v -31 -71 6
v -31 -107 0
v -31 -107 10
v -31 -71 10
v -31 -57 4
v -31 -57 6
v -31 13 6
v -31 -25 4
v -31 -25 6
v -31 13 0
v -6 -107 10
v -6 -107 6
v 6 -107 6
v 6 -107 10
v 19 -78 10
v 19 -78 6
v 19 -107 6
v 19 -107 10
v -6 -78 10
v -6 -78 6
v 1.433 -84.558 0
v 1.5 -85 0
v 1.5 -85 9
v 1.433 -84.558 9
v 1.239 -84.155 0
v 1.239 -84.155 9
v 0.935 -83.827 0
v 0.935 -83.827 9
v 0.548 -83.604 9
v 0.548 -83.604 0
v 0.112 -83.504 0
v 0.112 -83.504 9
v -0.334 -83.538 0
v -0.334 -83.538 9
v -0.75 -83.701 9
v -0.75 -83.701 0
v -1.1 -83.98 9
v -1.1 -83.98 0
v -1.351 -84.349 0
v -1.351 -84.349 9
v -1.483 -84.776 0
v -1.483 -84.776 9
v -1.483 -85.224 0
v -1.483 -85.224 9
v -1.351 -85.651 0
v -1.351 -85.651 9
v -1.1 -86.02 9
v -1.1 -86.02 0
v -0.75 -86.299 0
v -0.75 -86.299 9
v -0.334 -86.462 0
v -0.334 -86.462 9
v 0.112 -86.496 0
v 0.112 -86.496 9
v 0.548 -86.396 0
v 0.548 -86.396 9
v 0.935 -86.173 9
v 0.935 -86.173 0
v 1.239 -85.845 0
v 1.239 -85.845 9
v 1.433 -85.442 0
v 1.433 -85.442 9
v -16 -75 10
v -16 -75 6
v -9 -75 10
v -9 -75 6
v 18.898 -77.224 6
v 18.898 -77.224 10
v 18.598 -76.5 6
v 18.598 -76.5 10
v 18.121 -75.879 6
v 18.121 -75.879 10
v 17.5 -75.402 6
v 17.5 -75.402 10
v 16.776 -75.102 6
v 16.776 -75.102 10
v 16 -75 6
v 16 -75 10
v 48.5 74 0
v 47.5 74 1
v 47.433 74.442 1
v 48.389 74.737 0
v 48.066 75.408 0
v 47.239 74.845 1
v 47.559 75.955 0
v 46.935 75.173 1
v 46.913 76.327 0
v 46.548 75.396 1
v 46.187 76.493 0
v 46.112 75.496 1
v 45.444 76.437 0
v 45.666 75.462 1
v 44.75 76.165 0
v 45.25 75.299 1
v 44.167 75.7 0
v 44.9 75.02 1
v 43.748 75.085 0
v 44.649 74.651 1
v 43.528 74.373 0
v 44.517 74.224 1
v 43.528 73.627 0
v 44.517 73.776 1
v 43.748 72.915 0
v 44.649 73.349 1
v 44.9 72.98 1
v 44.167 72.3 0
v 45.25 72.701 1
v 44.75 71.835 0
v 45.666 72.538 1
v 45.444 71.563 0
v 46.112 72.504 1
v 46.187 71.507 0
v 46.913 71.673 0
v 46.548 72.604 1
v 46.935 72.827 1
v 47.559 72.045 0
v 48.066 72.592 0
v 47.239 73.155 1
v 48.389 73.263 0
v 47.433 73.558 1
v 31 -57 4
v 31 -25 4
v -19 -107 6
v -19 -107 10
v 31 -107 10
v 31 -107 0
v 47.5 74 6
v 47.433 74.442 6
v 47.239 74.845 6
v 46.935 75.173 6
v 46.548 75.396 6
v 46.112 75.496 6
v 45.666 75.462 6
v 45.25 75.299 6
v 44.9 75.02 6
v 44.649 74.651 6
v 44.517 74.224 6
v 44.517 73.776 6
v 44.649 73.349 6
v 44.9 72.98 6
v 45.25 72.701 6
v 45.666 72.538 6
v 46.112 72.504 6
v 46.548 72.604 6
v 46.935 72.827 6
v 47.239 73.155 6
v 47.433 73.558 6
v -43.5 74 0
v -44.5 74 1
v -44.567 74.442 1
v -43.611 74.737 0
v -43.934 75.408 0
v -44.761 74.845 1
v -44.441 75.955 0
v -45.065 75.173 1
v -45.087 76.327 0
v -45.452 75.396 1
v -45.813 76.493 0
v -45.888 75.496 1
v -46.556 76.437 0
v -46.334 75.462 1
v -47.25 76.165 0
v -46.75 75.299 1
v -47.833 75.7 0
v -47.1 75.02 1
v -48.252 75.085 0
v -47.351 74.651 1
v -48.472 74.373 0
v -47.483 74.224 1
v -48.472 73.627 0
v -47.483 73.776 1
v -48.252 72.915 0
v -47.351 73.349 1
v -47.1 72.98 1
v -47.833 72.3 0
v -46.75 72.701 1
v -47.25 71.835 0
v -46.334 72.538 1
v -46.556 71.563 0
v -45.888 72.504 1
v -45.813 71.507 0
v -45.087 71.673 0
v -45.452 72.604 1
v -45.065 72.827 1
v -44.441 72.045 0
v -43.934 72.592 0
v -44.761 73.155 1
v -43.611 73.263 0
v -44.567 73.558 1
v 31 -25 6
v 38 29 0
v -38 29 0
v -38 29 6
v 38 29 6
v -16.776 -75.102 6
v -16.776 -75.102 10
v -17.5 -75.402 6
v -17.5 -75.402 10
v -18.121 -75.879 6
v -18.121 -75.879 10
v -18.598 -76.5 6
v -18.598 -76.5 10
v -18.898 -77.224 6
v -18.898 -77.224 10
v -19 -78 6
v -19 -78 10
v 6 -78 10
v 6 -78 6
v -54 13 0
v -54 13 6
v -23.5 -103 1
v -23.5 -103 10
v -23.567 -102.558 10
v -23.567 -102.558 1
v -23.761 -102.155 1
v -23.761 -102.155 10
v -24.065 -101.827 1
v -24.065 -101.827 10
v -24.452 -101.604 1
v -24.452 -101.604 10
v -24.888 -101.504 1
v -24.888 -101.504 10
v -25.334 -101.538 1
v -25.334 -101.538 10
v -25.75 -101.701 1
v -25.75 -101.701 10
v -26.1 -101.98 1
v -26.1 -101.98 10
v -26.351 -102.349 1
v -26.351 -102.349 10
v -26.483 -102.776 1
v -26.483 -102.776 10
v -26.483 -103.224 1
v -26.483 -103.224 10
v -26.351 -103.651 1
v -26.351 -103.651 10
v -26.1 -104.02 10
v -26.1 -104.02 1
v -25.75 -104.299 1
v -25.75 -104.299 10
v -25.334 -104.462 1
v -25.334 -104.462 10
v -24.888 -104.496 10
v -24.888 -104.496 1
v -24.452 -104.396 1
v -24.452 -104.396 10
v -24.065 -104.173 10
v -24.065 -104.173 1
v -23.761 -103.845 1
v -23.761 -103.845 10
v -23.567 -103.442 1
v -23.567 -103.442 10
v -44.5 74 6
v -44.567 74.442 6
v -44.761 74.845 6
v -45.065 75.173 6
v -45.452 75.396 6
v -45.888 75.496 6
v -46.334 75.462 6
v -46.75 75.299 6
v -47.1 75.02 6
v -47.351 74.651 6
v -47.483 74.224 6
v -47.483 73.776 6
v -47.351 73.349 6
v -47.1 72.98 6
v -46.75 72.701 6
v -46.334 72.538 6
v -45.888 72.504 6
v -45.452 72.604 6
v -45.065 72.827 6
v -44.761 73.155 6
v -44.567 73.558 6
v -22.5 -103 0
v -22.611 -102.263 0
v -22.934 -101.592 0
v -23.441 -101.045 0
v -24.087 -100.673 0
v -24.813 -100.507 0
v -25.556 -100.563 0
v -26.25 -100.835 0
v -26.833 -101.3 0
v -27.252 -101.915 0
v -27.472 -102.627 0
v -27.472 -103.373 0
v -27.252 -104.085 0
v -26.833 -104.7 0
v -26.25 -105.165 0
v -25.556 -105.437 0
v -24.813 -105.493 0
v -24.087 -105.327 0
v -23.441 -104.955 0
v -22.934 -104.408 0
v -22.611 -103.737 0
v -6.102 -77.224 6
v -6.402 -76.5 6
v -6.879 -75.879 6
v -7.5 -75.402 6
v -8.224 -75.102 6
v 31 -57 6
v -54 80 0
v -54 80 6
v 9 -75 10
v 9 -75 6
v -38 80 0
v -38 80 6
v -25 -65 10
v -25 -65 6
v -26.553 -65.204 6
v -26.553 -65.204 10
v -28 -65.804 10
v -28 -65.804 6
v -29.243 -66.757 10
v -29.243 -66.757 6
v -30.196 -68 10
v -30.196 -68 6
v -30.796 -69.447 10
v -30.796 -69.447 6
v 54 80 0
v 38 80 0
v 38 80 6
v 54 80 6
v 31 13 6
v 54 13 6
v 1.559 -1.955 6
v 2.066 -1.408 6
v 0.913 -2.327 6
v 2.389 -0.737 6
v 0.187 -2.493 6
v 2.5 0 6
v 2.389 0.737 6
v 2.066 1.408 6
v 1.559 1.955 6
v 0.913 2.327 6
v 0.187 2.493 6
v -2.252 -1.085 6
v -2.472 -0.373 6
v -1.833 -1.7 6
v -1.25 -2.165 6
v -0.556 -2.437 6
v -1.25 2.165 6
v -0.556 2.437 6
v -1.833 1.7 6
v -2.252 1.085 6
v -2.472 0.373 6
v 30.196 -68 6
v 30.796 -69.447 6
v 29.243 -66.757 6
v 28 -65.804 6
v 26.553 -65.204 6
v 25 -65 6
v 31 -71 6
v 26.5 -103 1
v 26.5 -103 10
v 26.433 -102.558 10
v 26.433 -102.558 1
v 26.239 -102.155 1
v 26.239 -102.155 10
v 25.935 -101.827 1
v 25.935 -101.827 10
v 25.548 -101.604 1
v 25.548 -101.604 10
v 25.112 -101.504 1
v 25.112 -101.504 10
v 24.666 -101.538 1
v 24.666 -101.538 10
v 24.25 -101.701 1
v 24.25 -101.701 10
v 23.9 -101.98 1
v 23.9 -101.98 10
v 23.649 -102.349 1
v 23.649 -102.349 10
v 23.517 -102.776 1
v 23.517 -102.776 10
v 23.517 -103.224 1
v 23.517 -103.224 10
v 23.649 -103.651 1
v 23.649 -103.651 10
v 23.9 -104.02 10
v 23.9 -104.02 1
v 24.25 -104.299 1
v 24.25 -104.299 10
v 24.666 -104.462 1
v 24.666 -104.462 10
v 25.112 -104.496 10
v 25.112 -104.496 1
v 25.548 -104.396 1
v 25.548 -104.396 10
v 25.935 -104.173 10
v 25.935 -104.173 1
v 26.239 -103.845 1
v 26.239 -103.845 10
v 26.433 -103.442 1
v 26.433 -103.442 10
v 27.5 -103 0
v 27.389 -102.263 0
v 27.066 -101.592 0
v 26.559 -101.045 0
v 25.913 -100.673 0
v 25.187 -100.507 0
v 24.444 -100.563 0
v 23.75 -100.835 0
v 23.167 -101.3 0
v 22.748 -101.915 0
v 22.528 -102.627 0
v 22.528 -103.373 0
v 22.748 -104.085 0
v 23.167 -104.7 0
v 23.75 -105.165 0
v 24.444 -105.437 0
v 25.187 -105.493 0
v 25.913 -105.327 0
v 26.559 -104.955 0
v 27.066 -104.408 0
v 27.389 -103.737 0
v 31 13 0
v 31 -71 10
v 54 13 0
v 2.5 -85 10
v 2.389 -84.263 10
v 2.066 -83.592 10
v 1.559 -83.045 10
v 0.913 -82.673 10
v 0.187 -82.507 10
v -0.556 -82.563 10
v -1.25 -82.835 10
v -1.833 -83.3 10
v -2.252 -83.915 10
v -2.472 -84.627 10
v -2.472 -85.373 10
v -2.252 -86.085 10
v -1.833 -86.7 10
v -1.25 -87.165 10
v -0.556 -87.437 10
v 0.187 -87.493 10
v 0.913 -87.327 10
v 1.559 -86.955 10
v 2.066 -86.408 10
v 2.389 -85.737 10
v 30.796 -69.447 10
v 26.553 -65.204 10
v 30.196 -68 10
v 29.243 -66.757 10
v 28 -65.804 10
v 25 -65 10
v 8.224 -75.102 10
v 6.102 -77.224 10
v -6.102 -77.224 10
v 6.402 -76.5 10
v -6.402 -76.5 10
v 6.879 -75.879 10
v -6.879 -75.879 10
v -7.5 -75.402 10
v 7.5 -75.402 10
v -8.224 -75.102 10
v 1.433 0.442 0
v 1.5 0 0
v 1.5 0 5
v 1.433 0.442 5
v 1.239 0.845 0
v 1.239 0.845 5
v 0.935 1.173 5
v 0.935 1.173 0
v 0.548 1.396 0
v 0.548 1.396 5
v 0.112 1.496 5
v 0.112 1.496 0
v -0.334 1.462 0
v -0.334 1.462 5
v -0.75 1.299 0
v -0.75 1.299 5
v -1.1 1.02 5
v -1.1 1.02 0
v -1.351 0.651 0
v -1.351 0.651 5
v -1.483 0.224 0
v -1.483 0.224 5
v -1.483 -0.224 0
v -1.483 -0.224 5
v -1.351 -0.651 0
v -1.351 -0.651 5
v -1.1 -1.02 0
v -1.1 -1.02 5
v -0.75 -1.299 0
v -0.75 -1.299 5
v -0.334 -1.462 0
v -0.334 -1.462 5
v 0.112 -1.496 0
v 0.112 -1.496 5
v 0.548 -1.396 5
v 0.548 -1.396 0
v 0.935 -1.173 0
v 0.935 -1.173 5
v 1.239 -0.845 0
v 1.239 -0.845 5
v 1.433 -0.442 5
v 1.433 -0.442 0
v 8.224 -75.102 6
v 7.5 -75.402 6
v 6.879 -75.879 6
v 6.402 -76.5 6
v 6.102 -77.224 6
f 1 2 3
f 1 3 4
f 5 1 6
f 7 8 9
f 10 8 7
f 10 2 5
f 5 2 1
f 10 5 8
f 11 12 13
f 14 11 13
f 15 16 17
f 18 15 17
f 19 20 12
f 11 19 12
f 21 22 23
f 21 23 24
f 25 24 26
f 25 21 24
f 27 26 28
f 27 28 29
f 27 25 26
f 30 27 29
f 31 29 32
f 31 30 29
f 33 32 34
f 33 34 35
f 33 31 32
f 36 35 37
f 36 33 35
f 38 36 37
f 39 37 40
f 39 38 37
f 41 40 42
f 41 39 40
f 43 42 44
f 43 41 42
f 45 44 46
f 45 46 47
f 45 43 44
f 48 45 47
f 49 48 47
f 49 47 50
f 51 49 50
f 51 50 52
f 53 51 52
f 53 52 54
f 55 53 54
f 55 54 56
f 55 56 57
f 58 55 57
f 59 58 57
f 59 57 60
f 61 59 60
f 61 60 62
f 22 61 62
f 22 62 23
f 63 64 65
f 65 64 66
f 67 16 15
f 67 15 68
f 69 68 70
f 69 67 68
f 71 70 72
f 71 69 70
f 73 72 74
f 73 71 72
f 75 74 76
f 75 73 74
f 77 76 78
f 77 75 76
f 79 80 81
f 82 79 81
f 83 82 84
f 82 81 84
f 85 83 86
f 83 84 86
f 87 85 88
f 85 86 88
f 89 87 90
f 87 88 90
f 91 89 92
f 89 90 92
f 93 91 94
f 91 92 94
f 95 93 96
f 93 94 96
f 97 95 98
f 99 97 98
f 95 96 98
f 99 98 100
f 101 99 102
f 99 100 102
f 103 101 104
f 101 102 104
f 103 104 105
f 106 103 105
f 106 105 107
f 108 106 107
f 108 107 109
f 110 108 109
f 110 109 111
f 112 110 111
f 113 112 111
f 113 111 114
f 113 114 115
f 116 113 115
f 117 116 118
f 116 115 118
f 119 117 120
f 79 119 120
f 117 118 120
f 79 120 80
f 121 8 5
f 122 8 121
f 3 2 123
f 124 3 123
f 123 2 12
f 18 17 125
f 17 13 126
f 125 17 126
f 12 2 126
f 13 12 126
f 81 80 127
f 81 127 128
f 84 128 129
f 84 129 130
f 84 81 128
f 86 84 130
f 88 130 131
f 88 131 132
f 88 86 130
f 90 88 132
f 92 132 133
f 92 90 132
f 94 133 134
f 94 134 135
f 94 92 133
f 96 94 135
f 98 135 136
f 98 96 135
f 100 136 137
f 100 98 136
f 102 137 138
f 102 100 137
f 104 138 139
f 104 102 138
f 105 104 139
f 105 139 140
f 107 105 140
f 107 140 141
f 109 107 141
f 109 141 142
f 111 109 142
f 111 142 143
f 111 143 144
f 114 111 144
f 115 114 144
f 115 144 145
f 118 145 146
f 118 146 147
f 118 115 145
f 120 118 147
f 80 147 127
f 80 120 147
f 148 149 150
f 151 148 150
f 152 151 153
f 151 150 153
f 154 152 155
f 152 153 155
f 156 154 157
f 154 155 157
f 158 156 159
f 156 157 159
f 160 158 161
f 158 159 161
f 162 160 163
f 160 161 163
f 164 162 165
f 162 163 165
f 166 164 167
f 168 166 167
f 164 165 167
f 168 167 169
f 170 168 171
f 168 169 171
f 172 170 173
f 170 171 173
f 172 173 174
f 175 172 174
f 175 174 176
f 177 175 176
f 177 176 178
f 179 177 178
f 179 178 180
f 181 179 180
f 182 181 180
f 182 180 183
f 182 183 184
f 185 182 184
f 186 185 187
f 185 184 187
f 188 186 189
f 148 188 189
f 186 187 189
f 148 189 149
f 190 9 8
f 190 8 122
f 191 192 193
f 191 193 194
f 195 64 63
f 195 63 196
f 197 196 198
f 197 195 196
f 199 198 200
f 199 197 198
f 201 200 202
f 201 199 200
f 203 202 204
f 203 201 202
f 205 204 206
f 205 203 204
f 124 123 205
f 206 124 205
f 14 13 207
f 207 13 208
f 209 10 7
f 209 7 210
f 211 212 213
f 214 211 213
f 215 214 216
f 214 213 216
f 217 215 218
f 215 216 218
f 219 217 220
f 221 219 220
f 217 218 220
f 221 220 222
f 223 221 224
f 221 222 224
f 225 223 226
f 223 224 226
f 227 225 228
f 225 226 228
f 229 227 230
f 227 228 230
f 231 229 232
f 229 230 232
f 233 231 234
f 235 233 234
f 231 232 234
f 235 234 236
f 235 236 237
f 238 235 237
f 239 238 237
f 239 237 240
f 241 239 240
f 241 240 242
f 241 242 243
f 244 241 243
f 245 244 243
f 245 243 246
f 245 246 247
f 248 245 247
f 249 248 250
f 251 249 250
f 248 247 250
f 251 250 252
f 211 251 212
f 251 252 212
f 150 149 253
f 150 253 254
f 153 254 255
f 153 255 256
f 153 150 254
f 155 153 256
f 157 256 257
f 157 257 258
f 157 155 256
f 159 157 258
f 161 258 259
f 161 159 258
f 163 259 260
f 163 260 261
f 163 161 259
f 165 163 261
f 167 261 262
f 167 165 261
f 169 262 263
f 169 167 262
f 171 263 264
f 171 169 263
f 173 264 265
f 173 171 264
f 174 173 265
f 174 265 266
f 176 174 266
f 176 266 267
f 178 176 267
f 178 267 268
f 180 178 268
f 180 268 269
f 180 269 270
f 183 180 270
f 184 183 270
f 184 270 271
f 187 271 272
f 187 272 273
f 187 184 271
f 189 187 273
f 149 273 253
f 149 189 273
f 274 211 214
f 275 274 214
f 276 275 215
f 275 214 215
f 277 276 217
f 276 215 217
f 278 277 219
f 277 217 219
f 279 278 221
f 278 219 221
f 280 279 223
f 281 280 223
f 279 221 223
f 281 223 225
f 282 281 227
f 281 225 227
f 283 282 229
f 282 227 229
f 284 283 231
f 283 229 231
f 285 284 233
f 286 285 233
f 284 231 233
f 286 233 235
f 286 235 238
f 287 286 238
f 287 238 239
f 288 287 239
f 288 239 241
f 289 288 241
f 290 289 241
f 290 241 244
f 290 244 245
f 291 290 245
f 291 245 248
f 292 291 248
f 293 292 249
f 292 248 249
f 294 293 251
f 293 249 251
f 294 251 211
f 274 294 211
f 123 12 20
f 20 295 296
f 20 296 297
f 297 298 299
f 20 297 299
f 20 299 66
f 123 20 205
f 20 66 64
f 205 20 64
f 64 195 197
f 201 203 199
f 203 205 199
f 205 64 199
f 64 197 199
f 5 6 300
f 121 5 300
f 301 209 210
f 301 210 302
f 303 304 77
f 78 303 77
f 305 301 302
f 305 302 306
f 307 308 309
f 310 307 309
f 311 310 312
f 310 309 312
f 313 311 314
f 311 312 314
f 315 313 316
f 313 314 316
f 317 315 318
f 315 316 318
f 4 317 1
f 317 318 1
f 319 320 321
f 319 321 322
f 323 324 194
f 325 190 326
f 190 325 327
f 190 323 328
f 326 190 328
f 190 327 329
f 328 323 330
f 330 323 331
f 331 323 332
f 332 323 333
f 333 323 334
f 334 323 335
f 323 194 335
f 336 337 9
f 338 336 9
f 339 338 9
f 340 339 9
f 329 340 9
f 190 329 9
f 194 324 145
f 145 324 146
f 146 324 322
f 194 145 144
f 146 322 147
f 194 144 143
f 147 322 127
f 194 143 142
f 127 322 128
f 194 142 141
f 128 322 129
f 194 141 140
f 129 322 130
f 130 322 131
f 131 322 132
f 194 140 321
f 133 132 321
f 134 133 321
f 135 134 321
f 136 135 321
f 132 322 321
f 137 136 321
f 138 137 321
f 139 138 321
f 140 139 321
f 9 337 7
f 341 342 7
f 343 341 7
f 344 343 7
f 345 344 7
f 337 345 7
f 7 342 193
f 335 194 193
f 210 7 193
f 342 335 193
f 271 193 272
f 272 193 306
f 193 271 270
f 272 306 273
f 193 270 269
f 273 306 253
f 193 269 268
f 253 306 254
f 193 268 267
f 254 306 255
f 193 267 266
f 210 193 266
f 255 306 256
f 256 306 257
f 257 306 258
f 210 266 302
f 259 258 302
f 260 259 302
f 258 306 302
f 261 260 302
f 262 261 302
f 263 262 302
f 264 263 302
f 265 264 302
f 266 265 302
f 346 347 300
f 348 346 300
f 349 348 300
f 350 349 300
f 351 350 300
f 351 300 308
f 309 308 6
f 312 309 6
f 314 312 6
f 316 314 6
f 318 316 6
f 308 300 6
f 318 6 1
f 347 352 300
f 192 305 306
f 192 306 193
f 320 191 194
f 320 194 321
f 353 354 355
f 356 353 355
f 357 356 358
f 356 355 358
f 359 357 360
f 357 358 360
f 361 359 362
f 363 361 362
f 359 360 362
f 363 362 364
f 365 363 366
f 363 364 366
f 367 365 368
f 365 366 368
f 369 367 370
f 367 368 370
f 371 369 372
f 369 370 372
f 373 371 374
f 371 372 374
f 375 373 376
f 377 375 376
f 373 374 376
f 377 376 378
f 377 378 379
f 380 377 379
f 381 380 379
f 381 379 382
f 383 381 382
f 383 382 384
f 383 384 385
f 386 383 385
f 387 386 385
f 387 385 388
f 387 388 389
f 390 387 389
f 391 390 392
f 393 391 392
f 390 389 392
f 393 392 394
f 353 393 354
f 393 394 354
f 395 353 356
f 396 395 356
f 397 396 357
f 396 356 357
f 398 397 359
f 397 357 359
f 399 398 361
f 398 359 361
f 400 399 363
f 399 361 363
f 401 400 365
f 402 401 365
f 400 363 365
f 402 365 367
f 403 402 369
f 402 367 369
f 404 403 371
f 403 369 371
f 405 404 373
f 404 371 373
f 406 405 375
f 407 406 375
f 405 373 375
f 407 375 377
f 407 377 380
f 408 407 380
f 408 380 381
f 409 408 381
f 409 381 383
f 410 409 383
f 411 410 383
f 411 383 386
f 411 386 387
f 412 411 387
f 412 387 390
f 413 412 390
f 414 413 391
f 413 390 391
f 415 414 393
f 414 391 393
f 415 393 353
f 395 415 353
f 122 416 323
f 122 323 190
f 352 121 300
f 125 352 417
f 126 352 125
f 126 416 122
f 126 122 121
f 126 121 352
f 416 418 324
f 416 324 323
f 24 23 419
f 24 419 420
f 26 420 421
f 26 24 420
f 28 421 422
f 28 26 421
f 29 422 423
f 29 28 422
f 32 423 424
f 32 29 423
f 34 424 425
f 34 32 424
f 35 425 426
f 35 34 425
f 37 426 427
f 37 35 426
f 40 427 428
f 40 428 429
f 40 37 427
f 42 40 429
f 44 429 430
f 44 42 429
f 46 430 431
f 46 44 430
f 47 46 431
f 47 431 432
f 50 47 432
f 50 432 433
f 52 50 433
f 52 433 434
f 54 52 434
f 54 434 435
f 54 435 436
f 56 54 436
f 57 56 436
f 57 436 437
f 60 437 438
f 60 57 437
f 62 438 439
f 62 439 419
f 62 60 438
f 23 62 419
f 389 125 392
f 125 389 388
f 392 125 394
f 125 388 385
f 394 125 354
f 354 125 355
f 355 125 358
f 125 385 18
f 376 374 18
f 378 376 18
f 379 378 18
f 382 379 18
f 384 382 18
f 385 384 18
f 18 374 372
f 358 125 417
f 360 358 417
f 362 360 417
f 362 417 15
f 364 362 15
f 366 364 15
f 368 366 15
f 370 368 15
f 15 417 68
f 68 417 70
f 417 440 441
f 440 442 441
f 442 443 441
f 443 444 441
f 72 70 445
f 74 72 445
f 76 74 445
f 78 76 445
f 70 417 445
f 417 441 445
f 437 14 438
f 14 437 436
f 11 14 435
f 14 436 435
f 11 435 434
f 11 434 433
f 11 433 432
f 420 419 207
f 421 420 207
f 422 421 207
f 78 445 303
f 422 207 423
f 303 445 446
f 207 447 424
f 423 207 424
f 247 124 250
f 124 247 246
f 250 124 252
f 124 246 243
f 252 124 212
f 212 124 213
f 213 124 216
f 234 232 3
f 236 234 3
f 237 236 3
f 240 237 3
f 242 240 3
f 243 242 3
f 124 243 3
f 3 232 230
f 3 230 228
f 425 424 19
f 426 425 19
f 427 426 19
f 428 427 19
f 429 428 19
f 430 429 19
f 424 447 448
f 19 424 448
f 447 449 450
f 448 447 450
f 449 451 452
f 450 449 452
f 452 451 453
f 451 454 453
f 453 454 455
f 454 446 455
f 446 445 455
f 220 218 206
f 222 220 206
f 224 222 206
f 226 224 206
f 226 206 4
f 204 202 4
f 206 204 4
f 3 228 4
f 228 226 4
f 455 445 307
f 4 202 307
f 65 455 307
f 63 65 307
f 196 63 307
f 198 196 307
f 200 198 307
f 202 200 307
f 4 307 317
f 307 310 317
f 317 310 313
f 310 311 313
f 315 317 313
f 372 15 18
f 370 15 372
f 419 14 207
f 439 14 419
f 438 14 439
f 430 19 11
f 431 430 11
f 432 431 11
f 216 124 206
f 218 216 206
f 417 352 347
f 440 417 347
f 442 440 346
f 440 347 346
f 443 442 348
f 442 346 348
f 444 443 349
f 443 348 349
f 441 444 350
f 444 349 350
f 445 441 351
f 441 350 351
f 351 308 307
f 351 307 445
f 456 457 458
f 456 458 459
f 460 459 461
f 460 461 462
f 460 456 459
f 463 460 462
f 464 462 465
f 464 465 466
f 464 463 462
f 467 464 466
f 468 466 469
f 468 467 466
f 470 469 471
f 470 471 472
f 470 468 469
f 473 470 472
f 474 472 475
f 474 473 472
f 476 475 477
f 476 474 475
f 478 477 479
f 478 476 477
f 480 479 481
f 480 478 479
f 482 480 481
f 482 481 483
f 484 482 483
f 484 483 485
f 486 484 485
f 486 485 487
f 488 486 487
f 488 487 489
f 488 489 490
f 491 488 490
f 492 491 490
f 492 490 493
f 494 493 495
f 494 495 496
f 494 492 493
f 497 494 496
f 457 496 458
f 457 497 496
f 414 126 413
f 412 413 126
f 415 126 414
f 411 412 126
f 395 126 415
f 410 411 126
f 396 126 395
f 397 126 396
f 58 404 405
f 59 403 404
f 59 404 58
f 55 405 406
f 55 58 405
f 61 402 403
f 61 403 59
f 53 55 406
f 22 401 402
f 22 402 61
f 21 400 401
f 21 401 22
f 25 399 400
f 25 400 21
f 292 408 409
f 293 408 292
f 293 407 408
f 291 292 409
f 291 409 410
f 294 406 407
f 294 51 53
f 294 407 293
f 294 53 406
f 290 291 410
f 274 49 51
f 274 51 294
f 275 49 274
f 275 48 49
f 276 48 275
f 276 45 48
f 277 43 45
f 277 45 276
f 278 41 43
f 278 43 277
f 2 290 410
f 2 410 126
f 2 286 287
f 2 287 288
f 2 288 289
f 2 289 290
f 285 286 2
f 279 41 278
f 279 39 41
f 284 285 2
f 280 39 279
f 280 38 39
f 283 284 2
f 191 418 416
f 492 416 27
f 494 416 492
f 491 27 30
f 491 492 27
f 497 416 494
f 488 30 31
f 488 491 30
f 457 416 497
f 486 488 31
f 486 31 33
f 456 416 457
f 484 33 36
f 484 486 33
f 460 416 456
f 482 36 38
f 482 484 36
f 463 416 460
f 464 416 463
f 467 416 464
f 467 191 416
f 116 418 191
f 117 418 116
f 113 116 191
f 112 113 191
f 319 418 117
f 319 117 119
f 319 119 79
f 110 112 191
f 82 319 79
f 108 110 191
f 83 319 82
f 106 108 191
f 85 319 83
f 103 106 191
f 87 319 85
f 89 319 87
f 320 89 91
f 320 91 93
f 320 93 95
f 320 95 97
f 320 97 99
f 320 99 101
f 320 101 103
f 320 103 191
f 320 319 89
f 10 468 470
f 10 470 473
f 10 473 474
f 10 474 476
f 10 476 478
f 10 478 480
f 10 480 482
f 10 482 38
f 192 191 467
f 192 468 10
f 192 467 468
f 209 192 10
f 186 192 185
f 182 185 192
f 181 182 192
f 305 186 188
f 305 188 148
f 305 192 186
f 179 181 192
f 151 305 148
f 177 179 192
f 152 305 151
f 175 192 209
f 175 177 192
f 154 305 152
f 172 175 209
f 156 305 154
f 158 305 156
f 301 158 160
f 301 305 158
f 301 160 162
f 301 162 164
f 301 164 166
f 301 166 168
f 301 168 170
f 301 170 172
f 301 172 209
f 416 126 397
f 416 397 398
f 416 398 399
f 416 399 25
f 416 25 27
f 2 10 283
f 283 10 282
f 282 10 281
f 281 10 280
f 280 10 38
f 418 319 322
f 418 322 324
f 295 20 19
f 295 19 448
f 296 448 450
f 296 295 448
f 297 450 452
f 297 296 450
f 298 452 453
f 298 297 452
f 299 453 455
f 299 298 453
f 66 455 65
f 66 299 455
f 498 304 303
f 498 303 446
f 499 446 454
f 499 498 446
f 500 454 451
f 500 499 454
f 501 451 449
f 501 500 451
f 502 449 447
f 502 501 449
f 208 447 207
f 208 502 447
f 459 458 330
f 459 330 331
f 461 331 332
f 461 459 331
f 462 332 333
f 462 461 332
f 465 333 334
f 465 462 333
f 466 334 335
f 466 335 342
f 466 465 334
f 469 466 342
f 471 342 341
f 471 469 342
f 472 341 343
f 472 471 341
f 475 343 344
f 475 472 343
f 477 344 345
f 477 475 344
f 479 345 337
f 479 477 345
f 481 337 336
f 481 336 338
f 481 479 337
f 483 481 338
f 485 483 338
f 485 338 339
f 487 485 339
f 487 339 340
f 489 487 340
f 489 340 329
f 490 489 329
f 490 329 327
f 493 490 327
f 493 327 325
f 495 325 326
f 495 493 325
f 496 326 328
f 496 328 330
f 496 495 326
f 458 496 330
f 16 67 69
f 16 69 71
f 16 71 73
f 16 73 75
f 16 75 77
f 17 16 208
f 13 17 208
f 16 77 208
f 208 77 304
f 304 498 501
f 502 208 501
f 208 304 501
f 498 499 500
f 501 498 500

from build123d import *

# Parameters (mm, degrees)
SKETCH_R        = 1.5
PAD_DEPTH       = 6
SKETCH001_R     = 1.5
PAD001_DEPTH    = 4
SKETCH002_R     = 1.5
POCKET_DEPTH    = 10
CHAMFER_SIZE    = 1
SKETCH003_W     = 100
SKETCH003_H     = 32
POCKET001_DEPTH = 2


with BuildPart() as part:
    # Sketch → Pad (new body)
    with BuildSketch(Plane.XY):
        Polygon((-38, 29), (38, 29), (38, 80), (54, 80), (54, 13), (31, 13), (31, -107), (-31, -107), (-31, 13), (-54, 13), (-54, 80), (-38, 80), align=None)
        Circle(SKETCH_R, mode=Mode.SUBTRACT)
        with Locations((0, -85)):
            Circle(SKETCH_R, mode=Mode.SUBTRACT)
        with Locations((46, 74)):
            Circle(SKETCH_R, mode=Mode.SUBTRACT)
        with Locations((-46, 74)):
            Circle(SKETCH_R, mode=Mode.SUBTRACT)
    extrude(amount=PAD_DEPTH)

    # Sketch001 (on Face18 of Pad) → Pad001 (join)
    with BuildSketch(Plane.XY.offset(6)):
        with BuildLine():
            Line((31, -71), (31, -107))
            Line((19, -107), (31, -107))
            Line((19, -78.000015), (19, -107))
            ThreePointArc((19, -78.000015), (18.12132, -75.878696), (16.000001, -75.000016))
            Line((8.999999, -75.000016), (16.000001, -75.000016))
            ThreePointArc((8.999999, -75.000016), (6.878678, -75.878697), (6, -78.000019))
            Line((6, -107.000009), (6, -78.000019))
            Line((-6, -107.000009), (6, -107.000009))
            Line((-6, -78.000019), (-6, -107.000009))
            ThreePointArc((-6, -78.000019), (-6.878676, -75.878693), (-8.999999, -75.000009))
            Line((-16.000001, -75.000009), (-8.999999, -75.000009))
            ThreePointArc((-16.000001, -75.000009), (-18.12132, -75.878689), (-19, -78.000009))
            Line((-19, -107), (-19, -78.000009))
            Line((-31, -107), (-19, -107))
            Line((-31, -107), (-31, -71))
            ThreePointArc((-25, -65), (-29.242641, -66.757359), (-31, -71))
            Line((-25, -65), (25, -65))
            ThreePointArc((31, -71), (29.242641, -66.757359), (25, -65))
        make_face()
        with Locations((0, -85)):
            Circle(SKETCH001_R, mode=Mode.SUBTRACT)
    extrude(amount=PAD001_DEPTH)

    # Sketch002 (on Face30 of Pad001) → Pocket (cut)
    with BuildSketch(Plane.XY.offset(10)):
        with Locations((-25, -103)):
            Circle(SKETCH002_R)
        with Locations((25, -103)):
            Circle(SKETCH002_R)
    extrude(amount=-POCKET_DEPTH, mode=Mode.SUBTRACT)

    # Chamfer
    chamfer_edges = [part.edges().sort_by_distance(p)[0] for p in [
        (23.5, -103, 0),
        (-26.5, -103, 0),
        (-47.5, 74, 0),
        (44.5, 74, 0),
        (-1.5, -85, 10),
        (-1.5, 0, 6),
    ]]
    chamfer(chamfer_edges, length=CHAMFER_SIZE)

    # Sketch003 (on Face21 of Chamfer) → Pocket001 (cut)
    with BuildSketch(Plane.XY.offset(6)):
        with Locations((0, -41)):
            Rectangle(SKETCH003_W, SKETCH003_H)
    extrude(amount=-POCKET001_DEPTH, mode=Mode.SUBTRACT)


solid = part.part
